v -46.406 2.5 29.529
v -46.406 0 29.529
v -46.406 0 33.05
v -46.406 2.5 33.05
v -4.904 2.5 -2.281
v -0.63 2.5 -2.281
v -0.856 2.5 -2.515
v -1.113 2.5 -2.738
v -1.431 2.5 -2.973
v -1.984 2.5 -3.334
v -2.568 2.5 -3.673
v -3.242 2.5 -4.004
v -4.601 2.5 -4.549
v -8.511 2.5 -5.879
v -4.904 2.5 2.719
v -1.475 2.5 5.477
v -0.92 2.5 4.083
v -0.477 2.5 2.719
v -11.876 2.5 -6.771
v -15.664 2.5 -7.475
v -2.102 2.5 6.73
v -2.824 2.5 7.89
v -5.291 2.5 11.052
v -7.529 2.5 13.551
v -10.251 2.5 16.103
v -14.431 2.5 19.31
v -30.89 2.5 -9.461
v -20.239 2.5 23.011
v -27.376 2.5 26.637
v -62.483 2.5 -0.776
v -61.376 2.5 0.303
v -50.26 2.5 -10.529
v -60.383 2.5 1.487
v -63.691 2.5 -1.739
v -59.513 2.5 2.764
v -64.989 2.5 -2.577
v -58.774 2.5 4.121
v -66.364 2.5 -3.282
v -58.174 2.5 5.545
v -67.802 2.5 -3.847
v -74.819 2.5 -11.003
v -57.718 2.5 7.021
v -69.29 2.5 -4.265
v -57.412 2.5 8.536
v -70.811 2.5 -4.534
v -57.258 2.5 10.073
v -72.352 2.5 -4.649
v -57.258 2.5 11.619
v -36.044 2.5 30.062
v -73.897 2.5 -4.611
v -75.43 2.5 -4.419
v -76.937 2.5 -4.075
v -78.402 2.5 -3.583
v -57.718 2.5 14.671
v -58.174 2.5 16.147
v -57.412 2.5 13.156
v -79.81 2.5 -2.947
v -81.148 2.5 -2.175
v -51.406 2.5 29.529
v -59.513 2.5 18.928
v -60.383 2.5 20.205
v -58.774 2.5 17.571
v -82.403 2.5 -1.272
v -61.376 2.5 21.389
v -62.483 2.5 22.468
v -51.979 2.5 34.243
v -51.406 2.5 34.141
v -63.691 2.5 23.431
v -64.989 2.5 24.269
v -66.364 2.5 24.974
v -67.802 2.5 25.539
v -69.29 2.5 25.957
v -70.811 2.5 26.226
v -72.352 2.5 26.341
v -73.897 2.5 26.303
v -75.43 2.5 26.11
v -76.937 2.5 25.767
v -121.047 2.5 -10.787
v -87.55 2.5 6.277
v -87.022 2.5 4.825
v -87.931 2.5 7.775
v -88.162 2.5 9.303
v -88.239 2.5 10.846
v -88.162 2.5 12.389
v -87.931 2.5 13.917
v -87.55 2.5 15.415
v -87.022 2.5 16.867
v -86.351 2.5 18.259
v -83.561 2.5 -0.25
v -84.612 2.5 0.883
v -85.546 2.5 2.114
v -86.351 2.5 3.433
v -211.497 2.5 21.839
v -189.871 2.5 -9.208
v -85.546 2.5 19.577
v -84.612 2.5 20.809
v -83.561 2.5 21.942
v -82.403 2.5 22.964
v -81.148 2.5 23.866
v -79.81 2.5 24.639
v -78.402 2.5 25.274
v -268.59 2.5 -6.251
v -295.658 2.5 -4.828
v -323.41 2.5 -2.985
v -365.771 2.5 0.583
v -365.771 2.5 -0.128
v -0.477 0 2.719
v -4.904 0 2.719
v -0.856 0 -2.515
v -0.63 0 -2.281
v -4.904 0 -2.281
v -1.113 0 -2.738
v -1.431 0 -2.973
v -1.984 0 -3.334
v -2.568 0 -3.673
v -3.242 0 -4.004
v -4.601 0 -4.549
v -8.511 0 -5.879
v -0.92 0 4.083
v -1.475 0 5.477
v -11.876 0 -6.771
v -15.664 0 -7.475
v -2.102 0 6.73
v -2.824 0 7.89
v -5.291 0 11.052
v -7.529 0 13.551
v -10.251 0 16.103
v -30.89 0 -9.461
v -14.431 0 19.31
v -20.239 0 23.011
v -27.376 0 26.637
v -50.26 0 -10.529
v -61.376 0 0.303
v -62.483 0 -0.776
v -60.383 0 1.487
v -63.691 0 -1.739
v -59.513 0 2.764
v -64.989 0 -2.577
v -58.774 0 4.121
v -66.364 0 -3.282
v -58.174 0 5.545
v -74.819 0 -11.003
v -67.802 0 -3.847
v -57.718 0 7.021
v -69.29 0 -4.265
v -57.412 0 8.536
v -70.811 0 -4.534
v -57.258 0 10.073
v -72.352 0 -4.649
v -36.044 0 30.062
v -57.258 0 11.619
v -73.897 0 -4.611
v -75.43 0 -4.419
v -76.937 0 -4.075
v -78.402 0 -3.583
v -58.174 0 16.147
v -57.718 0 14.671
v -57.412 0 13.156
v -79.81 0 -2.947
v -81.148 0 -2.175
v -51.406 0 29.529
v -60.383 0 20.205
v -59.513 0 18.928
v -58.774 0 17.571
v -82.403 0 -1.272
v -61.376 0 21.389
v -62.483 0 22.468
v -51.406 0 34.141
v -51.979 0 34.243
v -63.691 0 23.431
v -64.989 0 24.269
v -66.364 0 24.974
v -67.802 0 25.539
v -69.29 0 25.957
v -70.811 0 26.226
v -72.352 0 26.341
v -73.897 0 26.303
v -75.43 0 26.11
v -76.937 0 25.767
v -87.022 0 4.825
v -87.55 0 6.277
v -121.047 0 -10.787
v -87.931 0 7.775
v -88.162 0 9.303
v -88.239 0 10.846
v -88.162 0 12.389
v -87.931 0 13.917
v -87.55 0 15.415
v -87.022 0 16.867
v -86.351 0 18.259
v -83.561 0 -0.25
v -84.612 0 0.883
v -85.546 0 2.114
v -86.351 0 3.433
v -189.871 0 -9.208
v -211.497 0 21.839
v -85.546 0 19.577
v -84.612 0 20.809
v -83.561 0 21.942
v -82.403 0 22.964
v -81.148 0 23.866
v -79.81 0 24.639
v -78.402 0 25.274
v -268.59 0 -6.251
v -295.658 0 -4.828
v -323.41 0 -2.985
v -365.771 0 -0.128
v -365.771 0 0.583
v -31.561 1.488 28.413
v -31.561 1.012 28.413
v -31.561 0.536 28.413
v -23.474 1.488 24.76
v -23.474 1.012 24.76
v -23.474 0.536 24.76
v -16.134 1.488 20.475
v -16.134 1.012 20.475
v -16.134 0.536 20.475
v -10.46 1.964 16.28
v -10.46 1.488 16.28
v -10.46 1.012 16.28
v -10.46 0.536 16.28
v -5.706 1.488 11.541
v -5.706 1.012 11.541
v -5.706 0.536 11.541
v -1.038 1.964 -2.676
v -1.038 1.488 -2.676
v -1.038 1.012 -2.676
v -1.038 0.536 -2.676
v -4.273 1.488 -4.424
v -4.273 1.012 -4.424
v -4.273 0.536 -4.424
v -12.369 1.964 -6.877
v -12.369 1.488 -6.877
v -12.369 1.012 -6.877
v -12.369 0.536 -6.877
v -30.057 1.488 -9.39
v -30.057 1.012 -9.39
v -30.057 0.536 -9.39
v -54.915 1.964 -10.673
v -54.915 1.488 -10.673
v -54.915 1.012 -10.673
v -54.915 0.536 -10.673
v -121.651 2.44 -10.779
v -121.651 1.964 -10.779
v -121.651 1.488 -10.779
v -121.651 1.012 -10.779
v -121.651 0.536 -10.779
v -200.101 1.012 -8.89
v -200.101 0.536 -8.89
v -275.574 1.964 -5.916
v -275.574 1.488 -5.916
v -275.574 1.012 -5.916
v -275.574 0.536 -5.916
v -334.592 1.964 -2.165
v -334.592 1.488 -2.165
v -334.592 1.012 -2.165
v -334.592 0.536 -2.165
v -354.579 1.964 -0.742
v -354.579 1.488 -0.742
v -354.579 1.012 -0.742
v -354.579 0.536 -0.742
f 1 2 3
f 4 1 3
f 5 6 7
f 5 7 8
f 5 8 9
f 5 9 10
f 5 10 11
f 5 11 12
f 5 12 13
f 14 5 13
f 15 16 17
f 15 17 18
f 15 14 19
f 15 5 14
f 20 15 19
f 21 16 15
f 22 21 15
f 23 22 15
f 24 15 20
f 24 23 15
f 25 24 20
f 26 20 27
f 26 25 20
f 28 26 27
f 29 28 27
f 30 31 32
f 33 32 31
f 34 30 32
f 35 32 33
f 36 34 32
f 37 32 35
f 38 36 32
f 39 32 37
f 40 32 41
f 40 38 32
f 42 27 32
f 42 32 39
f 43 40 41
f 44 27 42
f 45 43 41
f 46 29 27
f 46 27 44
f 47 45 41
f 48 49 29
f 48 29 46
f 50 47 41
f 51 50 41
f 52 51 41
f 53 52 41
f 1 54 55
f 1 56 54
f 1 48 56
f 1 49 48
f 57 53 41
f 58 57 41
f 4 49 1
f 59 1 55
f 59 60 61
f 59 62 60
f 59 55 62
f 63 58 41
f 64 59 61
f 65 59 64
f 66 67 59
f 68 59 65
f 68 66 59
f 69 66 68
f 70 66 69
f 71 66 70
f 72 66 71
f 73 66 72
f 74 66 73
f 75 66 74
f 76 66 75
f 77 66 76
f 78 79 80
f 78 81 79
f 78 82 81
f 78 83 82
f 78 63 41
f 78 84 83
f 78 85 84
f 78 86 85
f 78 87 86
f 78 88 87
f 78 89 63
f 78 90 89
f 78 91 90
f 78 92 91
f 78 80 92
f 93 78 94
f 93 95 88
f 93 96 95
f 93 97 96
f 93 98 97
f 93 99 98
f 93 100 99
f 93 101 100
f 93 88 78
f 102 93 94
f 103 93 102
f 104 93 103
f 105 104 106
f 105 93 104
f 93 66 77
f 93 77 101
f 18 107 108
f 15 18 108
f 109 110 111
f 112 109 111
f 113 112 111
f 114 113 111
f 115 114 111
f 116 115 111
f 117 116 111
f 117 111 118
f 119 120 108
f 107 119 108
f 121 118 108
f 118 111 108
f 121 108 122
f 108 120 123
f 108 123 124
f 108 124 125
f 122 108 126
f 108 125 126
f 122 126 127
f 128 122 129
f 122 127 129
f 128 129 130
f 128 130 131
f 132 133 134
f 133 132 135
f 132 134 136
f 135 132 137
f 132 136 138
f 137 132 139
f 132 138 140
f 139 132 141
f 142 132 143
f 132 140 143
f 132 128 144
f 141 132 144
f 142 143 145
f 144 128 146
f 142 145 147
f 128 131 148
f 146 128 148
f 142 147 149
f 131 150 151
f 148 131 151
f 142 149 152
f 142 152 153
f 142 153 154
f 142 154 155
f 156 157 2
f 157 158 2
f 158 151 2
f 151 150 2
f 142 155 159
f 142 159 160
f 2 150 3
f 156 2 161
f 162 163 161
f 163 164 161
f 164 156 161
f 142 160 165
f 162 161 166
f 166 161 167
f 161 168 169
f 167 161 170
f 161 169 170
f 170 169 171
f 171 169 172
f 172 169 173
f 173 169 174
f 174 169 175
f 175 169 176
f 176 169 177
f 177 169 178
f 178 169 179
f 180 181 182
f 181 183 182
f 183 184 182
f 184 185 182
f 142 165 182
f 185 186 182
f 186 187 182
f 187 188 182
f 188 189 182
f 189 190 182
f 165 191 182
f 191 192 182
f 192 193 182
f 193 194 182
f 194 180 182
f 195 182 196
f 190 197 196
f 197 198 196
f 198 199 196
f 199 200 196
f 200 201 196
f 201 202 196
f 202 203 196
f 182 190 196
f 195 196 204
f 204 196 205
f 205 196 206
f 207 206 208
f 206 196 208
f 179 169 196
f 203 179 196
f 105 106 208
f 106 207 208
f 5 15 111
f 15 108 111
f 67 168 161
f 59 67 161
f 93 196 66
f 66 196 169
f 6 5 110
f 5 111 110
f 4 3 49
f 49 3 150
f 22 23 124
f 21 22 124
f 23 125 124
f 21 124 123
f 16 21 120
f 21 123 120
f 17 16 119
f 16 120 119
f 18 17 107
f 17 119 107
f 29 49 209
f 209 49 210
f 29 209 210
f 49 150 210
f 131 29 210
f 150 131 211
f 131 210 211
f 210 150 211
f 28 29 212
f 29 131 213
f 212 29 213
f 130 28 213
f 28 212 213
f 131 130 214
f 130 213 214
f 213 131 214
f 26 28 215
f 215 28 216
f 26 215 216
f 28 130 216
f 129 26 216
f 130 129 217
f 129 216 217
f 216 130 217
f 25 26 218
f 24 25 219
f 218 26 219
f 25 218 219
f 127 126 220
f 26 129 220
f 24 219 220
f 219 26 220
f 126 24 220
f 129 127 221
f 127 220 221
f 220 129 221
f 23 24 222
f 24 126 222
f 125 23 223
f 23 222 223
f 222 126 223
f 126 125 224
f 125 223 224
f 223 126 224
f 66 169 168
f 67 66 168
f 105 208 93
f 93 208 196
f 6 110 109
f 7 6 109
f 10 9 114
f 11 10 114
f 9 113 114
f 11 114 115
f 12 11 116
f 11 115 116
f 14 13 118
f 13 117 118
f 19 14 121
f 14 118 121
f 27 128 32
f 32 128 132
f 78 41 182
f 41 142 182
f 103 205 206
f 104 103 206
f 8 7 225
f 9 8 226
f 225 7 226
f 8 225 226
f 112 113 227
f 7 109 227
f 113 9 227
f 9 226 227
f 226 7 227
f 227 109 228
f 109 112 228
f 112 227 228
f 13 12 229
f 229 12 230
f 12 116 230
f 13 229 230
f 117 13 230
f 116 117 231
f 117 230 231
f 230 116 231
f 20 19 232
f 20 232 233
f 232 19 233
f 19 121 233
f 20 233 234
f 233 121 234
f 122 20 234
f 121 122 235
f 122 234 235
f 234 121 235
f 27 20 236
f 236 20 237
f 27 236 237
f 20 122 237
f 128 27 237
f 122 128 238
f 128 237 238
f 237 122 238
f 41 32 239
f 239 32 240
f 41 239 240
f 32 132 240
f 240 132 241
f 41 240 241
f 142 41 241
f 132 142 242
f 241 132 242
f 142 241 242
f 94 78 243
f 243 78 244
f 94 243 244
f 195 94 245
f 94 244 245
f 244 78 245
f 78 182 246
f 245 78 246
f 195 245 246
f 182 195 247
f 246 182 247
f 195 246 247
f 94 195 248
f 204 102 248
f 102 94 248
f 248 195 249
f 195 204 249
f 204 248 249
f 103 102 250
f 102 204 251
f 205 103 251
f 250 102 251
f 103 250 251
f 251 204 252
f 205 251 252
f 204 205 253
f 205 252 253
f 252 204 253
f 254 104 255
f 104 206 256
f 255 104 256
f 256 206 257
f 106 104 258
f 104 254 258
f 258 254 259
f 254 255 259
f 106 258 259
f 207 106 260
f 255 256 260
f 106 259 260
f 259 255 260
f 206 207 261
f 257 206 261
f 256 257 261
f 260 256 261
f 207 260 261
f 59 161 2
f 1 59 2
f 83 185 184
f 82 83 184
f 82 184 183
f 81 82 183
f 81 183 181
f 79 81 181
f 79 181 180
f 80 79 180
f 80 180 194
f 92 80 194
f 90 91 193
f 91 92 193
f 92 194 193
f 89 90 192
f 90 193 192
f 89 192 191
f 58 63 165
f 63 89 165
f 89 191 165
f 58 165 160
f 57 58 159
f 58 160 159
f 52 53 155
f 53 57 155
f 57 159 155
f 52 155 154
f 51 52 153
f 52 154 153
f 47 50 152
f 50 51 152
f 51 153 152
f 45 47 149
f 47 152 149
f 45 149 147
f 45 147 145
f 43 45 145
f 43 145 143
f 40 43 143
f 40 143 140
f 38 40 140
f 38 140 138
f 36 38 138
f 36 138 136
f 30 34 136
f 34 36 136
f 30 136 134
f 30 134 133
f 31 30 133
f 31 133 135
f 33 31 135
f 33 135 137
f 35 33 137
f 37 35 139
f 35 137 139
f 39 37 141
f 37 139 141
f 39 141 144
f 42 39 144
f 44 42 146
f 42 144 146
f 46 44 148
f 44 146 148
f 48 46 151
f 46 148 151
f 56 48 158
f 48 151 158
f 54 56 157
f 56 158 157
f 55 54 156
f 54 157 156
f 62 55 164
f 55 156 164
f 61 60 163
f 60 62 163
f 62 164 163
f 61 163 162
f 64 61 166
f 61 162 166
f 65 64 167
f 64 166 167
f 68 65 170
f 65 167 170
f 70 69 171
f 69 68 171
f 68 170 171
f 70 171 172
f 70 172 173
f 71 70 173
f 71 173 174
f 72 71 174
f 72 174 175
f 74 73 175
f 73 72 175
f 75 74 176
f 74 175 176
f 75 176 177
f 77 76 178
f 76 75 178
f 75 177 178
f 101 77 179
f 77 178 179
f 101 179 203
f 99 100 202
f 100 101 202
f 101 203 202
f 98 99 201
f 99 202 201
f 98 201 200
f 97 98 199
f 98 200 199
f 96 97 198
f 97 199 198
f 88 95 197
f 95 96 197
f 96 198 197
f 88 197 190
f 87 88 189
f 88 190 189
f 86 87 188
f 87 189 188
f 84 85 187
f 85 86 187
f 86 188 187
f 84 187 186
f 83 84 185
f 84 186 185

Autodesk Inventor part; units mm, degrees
ref_plane "YZ Plane" through (0, 0, 0) normal (1, 0, 0) x (0, 1, 0)
ref_plane "XZ Plane" through (0, 0, 0) normal (0, 1, 0) x (-1, 0, 0)
ref_plane "XY Plane" through (0, 0, 0) normal (0, 0, 1) x (1, 0, 0)
sketch "Sketch1" plane through (0, 0, 0) normal (0, 1, 0) x (-1, 0, 0)
  spline S0 degree 4 poles (51.979, 34.2431) (49.1051, 33.7566) (39.5332, 31.5872) (30.1137, 28.1904) (19.6059, 22.8943) (13.0923, 18.5073) (7.8605, 14.3051) (3.9363, 9.4088) (1.5106, 6.3896) (0.0434, 1.3996) (-0.032, 0.3871) (0.028, -0.8915) (0.1768, -1.4854) (0.3983, -2.0441) (0.8215, -2.5037) (1.3408, -2.946) (2.6667, -3.7655) (3.7155, -4.2634) (10.6098, -6.747) (15.9249, -7.4764) (25.5133, -9.1262) (35.8155, -9.8616) (48.4495, -10.5455) (62.4279, -10.8762) (77.9663, -11.0677) (94.722, -11.0635) (112.5613, -10.9225) (131.2432, -10.6462) (150.5553, -10.2615) (170.2642, -9.7779) (190.1377, -9.2151) (209.9398, -8.5807) (229.4366, -7.8911) (248.3971, -7.1484) (266.6047, -6.3637) (283.8414, -5.5226) (299.9482, -4.5961) (314.7433, -3.6129) (328.1612, -2.6484) (339.8268, -1.769) (350.012, -1.0496) (357.5866, -0.5225) (364.806, -0.1794) (367.4848, -0.031) (370.1657, -0.0078) (369.9872, 0.0018) knots 0 0 0 0 0 0.056172 0.079777 0.102171 0.123272 0.142974 0.16113 0.176202 0.188392 0.197687 0.204488 0.210696 0.216571 0.223012 0.230232 0.240513 0.254518 0.272366 0.294434 0.318911 0.345468 0.373865 0.403873 0.435249 0.467749 0.501146 0.535218 0.569752 0.604537 0.639365 0.674029 0.708317 0.742021 0.774934 0.806859 0.837599 0.866942 0.894636 0.920358 0.943684 0.964014 0.980302 1 1 1 1 1
  circle A0 centre (370, 0) radius 160 construction
  line L0 (370, 0) -> (211.4974, 21.8387)
  circle A1 centre (211.4974, 21.8387) radius 160 construction
  line L1 (211.4974, 21.8387) -> (51.979, 34.2431)
  line L2 (-0.096, 2.719) -> (4.904, 2.719)
  line L3 (4.904, 2.719) -> (4.904, -2.281)
  line L4 (4.904, -2.281) -> (-0.096, -2.281)
  line L5 (-0.096, -2.281) -> (-0.096, 2.719)
  circle A2 centre (369.9872, 0.0018) radius 3 construction
  line L6 (365.7713, 2.7478) -> (370.7713, 2.7478)
  line L7 (370.7713, 2.7478) -> (370.7713, -2.2522)
  line L8 (370.7713, -2.2522) -> (365.7713, -2.2522)
  line L9 (365.7713, -2.2522) -> (365.7713, 2.7478)
  line L10 (211.4974, 21.8387) -> (210.0997, -8.5616) construction
  line L11 (46.4065, 34.5291) -> (51.4065, 34.5291)
  line L12 (51.4065, 34.5291) -> (51.4065, 29.5291)
  line L13 (51.4065, 29.5291) -> (46.4065, 29.5291)
  line L14 (46.4065, 29.5291) -> (46.4065, 34.5291)
  line L15 (46.4065, 34.5291) -> (51.4065, 29.5291) construction
  line L16 (51.4065, 34.5291) -> (46.4065, 29.5291) construction
  circle A3 centre (72.7388, 10.8459) radius 15.5
  point P0 (0, 0)
  point P1 (370, 0)
  point P2 (35.937, 30.0257)
  point P3 (27.0238, 26.4761)
  point P4 (19.2974, 22.4624)
  point P5 (12.8156, 18.139)
  point P6 (7.6237, 13.6489)
  point P7 (3.7499, 9.1521)
  point P8 (1.2115, 4.8535)
  point P9 (0.0668, 1.0195)
  point P10 (0.0003, -0.0638)
  point P11 (0.0755, -0.9849)
  point P12 (0.2106, -1.5356)
  point P13 (0.4302, -2.0122)
  point P14 (0.7739, -2.4345)
  point P15 (1.2488, -2.8423)
  point P16 (2.1566, -3.4383)
  point P17 (3.2773, -4.0196)
  point P18 (8.2772, -5.8071)
  point P19 (15.3669, -7.4261)
  point P20 (24.3167, -8.7706)
  point P21 (35.0526, -9.7678)
  point P22 (47.5438, -10.4262)
  point P23 (61.6814, -10.8267)
  point P24 (77.2847, -11.0213)
  point P25 (94.162, -11.0379)
  point P26 (112.1091, -10.9014)
  point P27 (130.911, -10.6315)
  point P28 (150.3435, -10.2474)
  point P29 (170.176, -9.7646)
  point P30 (190.1737, -9.1986)
  point P31 (229.7182, -7.8653)
  point P32 (248.7963, -7.1166)
  point P33 (267.1071, -6.3194)
  point P34 (284.4371, -5.4606)
  point P35 (300.619, -4.5258)
  point P36 (315.5184, -3.5432)
  point P37 (328.988, -2.5786)
  point P38 (340.8625, -1.7041)
  point P39 (350.9622, -0.9861)
  point P40 (359.0984, -0.4682)
  point P41 (365.0855, -0.1602)
  point P42 (368.7597, -0.0285)
  point P43 (370, 0)
  point P44 (0.4773, 2.719)
  point P45 (0.6305, -2.281)
  point P46 (365.7713, -0.1283)
  point P47 (368.4073, 0.2194)
  point P48 (48.9065, 32.0291)
  point P49 (112.1091, -11.9485)
  point P50 (365.7713, 0.5826)
  point P51 (51.4065, 34.1414)
  point P52 (46.4065, 33.0501)
  dimension "d5" = 160
  dimension "d8" = 160
  dimension "d17" = 5
  dimension "d18" = 5
  dimension "d25" = 6
  dimension "d26" = 5
  dimension "d27" = 5
  dimension "d36" = 5
  dimension "d37" = 5
  dimension "d50" = 368.7594
  dimension "d62" = 31
extrude "Extrusion4" add sketch "Sketch1" along normal blind 2.5 contours S0 L4 L3 L2 L14 L13 L12 L1 L0 L9
properties part number "airfoil blueprint"
